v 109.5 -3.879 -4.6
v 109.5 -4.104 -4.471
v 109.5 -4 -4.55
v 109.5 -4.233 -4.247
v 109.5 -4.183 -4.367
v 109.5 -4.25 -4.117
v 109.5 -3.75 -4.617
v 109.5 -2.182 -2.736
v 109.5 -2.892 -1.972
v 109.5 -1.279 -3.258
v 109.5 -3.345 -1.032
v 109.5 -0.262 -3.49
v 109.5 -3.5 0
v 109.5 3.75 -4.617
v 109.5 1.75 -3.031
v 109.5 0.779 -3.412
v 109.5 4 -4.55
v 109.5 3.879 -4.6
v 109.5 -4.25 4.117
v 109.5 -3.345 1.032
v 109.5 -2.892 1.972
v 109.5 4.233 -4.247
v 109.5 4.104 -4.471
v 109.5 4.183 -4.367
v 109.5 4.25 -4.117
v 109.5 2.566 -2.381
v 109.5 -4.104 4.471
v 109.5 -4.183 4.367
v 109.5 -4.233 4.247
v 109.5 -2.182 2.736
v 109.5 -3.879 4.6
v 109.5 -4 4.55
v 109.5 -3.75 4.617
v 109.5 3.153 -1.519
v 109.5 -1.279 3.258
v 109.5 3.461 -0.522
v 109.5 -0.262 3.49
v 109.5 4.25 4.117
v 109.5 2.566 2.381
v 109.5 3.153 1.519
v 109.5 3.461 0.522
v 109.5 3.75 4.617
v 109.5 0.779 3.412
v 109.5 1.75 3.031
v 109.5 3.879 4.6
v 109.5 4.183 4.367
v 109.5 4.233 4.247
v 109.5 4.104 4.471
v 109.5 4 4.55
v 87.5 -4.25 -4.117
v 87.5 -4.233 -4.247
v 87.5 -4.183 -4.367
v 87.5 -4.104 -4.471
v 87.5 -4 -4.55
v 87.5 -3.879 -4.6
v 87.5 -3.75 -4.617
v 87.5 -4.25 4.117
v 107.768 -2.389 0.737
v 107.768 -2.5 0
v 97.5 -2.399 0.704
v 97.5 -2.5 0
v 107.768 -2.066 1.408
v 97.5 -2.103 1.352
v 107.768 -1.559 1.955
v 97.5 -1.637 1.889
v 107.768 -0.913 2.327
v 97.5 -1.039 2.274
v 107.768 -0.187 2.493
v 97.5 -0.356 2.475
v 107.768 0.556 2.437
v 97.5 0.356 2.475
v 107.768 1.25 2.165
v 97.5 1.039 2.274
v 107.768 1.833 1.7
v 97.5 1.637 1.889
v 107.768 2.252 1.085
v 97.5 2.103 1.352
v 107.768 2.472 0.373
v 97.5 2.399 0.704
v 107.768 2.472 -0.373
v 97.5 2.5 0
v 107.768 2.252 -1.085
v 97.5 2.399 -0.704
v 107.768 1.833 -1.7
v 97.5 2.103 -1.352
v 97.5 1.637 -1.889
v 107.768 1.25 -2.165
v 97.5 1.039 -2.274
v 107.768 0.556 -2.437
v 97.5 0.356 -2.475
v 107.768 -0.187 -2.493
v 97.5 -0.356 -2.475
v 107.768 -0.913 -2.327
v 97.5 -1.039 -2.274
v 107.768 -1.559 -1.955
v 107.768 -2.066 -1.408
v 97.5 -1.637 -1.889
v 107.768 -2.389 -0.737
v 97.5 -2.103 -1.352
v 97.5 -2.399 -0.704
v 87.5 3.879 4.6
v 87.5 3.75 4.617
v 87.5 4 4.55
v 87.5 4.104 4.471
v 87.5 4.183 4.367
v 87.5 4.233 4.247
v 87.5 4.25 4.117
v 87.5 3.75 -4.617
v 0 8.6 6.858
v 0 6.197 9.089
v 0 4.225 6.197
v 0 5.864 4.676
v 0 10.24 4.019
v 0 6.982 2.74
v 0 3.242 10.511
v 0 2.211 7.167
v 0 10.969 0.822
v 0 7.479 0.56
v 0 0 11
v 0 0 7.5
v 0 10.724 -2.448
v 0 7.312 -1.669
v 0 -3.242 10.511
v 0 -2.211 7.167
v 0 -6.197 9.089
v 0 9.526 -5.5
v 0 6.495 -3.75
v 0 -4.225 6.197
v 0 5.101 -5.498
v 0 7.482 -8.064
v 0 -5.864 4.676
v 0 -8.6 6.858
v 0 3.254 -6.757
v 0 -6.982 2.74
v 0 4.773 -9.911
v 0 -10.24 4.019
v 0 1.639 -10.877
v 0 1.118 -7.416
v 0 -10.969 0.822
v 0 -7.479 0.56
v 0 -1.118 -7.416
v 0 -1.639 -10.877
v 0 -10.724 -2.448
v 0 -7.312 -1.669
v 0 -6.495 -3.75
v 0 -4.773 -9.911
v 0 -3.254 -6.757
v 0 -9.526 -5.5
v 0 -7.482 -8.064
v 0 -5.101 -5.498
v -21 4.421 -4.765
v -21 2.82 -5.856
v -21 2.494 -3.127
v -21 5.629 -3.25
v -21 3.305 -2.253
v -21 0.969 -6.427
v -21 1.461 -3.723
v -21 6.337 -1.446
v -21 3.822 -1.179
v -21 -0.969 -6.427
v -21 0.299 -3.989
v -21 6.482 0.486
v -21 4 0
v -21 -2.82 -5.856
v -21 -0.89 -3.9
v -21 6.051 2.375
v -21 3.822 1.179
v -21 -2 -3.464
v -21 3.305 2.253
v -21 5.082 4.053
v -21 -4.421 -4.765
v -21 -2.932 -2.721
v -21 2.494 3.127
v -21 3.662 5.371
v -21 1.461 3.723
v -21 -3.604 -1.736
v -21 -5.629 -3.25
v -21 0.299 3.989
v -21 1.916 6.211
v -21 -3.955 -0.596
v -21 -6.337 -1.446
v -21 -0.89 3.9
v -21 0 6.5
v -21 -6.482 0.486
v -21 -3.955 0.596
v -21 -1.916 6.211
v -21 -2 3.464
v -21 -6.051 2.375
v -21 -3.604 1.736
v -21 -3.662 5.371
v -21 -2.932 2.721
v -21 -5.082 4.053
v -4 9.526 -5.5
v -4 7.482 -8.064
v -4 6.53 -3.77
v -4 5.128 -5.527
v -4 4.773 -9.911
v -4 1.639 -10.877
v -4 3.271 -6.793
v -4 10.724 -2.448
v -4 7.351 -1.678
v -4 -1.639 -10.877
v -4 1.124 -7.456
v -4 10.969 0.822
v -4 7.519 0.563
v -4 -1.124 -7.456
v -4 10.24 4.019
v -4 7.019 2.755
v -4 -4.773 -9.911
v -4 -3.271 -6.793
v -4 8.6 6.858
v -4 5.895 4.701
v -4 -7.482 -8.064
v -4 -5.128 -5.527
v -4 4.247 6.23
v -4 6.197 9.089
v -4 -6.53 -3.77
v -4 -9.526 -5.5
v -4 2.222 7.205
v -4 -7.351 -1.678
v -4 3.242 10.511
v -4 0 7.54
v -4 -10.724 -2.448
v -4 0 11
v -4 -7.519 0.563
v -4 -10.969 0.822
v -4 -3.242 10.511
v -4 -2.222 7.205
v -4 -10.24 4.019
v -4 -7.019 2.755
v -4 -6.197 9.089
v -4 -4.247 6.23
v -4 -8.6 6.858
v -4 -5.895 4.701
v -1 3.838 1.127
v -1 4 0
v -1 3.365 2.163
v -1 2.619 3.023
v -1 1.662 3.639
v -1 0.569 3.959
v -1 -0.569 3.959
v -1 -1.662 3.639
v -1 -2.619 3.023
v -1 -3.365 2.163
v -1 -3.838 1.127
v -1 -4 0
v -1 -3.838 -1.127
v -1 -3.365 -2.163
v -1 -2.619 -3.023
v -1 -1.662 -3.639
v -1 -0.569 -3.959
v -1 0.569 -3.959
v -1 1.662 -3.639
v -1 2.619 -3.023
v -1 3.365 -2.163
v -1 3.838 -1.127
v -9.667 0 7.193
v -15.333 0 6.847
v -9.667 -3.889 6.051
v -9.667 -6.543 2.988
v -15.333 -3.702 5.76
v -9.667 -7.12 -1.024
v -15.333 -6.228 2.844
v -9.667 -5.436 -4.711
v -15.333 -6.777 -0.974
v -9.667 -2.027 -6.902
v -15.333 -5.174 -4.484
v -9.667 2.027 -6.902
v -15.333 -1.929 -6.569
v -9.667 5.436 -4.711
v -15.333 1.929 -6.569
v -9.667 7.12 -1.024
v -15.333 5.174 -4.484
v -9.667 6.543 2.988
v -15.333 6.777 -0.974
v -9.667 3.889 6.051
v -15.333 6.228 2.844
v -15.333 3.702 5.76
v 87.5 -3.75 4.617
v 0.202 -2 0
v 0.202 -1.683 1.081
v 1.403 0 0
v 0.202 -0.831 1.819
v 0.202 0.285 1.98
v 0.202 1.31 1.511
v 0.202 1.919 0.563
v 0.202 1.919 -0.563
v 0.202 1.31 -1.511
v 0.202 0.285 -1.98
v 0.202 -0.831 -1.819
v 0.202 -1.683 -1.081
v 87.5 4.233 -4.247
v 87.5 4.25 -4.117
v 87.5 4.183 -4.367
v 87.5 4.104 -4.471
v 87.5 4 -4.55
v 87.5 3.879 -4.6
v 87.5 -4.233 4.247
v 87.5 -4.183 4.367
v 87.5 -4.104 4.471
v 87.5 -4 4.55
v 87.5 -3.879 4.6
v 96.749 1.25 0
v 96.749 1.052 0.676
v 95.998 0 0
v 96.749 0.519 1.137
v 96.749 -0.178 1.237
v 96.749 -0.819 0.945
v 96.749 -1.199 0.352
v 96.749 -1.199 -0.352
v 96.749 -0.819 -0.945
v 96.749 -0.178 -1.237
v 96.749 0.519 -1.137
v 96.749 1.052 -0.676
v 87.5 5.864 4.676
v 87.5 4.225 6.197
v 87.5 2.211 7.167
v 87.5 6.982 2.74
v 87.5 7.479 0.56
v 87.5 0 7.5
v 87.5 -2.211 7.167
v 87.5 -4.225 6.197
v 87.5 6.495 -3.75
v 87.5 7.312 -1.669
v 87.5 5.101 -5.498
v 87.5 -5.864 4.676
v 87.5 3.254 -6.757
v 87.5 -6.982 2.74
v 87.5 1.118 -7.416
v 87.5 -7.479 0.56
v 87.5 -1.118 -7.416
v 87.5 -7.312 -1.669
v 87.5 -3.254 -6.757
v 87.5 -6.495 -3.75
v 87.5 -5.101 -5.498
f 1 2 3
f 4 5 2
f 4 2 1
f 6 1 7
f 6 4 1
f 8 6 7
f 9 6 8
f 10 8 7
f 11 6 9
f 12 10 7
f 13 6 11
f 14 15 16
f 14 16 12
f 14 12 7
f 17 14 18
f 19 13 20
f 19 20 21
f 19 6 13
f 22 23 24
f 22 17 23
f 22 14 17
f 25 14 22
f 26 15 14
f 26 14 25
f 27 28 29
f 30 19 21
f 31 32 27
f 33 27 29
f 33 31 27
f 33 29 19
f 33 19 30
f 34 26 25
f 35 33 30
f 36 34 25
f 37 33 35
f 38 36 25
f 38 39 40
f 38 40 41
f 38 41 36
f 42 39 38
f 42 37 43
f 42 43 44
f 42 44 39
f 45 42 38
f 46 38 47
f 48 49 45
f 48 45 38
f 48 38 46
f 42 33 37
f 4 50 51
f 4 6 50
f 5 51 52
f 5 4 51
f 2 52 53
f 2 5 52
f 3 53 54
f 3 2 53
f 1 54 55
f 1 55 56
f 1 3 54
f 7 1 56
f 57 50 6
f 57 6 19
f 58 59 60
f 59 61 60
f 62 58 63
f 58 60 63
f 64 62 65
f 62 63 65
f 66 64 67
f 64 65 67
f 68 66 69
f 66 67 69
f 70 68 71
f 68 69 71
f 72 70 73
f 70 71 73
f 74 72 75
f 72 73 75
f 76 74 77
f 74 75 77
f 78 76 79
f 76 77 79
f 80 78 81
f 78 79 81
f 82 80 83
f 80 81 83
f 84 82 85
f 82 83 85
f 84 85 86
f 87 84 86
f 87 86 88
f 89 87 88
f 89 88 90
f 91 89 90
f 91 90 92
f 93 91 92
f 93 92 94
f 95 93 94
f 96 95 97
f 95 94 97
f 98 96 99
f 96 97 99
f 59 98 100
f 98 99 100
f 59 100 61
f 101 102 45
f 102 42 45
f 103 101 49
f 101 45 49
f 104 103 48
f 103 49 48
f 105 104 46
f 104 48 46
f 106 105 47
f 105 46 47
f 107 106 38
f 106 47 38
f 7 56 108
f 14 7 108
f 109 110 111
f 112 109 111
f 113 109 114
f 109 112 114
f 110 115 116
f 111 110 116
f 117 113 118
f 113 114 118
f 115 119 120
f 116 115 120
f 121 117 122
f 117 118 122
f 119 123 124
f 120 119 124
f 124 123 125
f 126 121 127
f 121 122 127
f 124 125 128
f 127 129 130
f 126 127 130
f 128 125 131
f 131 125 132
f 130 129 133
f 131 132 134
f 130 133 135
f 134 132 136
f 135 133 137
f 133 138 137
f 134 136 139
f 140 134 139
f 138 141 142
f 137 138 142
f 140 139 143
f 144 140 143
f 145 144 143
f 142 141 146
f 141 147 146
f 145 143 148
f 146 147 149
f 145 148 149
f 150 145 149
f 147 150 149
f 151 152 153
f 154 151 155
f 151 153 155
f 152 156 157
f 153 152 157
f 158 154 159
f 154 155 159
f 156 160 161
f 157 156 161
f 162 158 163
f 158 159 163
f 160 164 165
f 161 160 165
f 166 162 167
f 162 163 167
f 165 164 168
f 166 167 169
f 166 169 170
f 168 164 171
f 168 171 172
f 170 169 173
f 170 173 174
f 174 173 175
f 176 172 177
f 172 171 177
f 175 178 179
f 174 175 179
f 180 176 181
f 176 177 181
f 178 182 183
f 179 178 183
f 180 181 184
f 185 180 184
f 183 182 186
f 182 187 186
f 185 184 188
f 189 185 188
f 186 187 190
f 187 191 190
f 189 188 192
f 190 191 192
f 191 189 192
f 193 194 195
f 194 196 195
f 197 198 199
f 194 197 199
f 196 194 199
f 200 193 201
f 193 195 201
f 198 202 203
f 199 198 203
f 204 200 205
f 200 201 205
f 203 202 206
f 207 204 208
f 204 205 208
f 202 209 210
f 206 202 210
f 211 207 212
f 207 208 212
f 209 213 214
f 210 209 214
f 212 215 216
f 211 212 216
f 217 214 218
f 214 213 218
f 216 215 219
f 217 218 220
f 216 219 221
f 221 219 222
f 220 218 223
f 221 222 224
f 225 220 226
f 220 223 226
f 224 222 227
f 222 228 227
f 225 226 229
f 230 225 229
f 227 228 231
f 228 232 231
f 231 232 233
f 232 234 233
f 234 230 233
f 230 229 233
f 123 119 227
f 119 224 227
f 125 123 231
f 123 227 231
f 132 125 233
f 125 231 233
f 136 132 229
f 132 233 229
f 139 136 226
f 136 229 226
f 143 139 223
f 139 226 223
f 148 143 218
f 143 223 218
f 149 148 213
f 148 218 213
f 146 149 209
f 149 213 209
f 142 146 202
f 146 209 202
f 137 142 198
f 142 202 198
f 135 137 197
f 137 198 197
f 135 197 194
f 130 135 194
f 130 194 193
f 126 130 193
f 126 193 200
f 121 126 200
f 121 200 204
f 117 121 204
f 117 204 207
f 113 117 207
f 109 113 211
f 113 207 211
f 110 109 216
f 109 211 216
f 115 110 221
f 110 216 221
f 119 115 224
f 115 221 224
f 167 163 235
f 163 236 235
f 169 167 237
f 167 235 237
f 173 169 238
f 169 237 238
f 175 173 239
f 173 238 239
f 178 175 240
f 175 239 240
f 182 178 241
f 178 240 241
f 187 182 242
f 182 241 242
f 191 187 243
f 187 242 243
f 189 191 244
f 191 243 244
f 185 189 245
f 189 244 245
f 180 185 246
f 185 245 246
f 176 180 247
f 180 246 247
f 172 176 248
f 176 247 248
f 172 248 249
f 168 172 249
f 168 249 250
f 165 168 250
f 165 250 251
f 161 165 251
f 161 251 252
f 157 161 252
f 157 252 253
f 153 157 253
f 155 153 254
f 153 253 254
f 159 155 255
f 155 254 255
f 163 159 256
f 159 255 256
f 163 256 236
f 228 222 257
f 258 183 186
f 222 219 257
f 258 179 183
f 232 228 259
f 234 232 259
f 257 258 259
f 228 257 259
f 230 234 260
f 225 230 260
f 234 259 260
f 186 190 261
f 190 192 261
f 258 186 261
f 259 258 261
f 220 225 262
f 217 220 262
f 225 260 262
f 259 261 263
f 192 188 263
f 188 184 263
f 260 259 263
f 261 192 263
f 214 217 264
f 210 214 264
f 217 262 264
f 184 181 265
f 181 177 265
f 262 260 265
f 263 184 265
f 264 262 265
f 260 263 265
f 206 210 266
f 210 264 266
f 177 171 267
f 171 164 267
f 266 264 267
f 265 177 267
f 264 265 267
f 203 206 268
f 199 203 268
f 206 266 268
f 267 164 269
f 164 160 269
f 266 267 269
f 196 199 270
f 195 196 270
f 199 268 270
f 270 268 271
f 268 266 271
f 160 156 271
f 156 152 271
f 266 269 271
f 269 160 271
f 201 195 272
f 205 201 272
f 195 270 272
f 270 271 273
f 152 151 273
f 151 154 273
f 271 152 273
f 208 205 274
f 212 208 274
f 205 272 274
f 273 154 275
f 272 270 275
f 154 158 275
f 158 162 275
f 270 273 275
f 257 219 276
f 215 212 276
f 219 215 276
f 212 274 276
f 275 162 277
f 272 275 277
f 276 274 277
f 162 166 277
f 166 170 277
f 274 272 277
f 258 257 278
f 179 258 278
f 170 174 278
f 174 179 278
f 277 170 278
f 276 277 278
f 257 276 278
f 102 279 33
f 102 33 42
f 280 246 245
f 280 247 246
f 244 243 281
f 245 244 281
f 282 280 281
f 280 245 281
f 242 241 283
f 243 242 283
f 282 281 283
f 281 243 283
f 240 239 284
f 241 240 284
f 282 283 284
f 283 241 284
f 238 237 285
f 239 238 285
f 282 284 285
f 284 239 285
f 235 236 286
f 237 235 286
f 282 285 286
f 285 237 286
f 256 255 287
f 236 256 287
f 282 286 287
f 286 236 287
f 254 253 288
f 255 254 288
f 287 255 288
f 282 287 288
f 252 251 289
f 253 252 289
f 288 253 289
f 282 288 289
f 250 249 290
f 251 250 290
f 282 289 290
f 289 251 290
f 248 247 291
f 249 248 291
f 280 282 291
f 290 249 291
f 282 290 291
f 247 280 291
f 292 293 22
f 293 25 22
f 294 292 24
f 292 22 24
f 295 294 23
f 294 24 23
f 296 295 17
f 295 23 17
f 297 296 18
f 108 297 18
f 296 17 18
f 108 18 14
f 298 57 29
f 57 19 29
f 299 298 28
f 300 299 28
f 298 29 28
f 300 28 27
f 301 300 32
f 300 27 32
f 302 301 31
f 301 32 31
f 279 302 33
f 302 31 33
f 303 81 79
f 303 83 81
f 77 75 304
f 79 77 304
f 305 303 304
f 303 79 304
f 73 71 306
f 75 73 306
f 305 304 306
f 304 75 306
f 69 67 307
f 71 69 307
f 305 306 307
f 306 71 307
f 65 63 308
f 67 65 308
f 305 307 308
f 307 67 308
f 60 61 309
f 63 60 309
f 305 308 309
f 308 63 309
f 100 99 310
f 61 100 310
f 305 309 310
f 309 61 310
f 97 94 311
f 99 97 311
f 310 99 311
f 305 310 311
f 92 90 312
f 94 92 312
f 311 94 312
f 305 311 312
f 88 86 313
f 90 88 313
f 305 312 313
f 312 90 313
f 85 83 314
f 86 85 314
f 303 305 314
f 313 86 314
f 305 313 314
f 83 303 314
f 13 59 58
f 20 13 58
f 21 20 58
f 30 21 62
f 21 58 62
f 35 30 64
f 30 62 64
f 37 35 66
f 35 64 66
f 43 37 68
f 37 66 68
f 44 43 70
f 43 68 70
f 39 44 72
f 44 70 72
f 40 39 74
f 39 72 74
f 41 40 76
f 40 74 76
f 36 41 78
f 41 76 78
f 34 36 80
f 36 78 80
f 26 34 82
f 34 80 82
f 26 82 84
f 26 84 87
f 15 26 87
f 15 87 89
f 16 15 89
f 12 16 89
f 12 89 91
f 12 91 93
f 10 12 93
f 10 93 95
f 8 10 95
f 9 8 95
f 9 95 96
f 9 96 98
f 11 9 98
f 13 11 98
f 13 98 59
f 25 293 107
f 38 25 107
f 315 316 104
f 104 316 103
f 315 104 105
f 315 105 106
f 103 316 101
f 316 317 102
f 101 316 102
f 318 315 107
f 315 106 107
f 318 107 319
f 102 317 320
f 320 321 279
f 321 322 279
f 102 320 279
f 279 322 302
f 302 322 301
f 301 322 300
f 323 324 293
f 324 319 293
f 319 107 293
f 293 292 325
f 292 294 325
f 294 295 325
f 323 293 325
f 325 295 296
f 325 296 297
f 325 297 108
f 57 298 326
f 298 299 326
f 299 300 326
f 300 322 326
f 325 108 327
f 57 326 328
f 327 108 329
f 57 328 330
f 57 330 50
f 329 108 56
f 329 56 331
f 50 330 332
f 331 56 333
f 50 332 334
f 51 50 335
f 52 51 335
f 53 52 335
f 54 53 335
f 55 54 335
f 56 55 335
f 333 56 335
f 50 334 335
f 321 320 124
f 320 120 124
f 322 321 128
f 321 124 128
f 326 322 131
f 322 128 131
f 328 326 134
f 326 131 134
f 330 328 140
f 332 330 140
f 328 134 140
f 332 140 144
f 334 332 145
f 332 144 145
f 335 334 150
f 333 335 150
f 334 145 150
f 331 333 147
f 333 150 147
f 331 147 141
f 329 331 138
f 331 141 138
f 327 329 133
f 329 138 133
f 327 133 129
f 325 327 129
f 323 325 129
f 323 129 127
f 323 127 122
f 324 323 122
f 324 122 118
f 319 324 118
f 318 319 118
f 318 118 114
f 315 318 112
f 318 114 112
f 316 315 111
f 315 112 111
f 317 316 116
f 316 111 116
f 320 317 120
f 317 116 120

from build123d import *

# Parameters (mm, degrees)
F2_W           = 8.5
F2_H           = 9.2348072443
F3_DEPTH       = 22
F5_D           = 8
F5_DEPTH       = 20
F5_TIP         = 2.4034424761
F6_R           = 0.5
F8_D           = 5
F8_DEPTH       = 12
F8_CSINK_D     = 7
F8_CSINK_ANGLE = 60
F8_TIP         = 1.5021515476


with BuildPart() as f1:
    # F0 (on Front) → F1 (revolve)
    with BuildSketch(Plane.XZ):
        Polygon((-21, 6.5), (-21, 0), (87.5, 0), (87.5, 7.5), (0, 7.5), (0, 11), (-4, 11), (-4, 7.5397645426), align=None)
    revolve(axis=Axis((33.25, 0, 0), (1, 0, 0)))

    # F2 (on face) → F3 (join)
    with BuildSketch(Plane.YZ.offset(87.5)):
        Rectangle(F2_W, F2_H)
    extrude(amount=F3_DEPTH)

    # F5
    with Locations(Plane(origin=(-21, 0, 0), x_dir=(0, -1, 0), z_dir=(-1, 0, 0))):
        with Locations((0, 0)):
            Hole(F5_D / 2, depth=F5_DEPTH)
            with Locations((0, 0, -(F5_DEPTH + F5_TIP / 2))):  # 118° drill point
                Cone(0, F5_D / 2, F5_TIP, mode=Mode.SUBTRACT)

    # F6
    f6_edges = [f1.edges().sort_by_distance(p)[0] for p in [
        (98.5, -4.25, 4.617404),
        (98.5, -4.25, -4.617404),
        (98.5, 4.25, 4.617404),
        (98.5, 4.25, -4.617404),
    ]]
    fillet(f6_edges, radius=F6_R)

    # F8
    with Locations(Plane.YZ.offset(109.5)):
        with Locations((0, 0)):
            CounterSinkHole(F8_D / 2, F8_CSINK_D / 2, depth=F8_DEPTH, counter_sink_angle=F8_CSINK_ANGLE)
            with Locations((0, 0, -(F8_DEPTH + F8_TIP / 2))):  # 118° drill point
                Cone(0, F8_D / 2, F8_TIP, mode=Mode.SUBTRACT)


solid = f1.part
